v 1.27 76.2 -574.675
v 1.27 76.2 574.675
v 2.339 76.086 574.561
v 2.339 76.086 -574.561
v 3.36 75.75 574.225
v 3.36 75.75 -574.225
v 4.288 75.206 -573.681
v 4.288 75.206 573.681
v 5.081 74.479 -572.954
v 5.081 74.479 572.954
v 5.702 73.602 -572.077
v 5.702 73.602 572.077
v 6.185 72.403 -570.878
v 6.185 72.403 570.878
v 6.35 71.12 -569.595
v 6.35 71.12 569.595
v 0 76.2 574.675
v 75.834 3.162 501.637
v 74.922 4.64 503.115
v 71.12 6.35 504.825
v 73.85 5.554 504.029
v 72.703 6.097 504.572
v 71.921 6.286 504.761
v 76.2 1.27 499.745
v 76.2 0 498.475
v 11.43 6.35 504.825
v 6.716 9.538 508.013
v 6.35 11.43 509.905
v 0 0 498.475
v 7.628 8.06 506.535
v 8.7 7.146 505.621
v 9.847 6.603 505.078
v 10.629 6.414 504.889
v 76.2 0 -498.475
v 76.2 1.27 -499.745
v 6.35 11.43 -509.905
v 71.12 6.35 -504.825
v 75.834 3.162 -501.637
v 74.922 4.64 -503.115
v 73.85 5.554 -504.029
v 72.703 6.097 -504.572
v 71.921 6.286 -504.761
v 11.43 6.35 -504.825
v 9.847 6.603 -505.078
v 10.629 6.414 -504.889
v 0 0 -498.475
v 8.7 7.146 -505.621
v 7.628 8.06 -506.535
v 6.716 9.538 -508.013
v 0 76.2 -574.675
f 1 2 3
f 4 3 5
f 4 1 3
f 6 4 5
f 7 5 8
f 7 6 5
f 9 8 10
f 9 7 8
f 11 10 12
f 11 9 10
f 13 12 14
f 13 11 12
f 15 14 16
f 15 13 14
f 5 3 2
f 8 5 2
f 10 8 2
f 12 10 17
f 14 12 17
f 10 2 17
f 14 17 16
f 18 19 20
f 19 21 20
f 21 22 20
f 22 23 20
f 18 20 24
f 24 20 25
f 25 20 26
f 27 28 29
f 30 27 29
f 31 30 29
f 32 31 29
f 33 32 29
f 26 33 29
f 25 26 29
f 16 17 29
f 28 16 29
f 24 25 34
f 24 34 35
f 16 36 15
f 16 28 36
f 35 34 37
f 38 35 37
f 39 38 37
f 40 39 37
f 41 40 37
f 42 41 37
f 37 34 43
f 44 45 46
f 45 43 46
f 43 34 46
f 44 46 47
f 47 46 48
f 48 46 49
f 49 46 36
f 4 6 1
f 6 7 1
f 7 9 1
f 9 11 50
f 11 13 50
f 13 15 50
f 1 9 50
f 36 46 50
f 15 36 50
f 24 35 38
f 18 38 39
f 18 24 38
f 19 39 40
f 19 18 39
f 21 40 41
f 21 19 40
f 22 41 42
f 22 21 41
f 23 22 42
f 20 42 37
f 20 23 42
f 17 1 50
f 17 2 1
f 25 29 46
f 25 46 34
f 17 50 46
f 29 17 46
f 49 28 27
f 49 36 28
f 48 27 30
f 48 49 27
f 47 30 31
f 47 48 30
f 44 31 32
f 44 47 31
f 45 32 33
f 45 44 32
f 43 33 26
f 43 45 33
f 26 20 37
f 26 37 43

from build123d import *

# Parameters (mm, degrees)
F1_DEPTH = 574.675
F3_DEPTH = 76.2
F4_R     = 5.08


with BuildPart() as f1:
    # F0 (on Top) → F1 (new body, symmetric)
    with BuildSketch(Plane.XY):
        Polygon((0, 76.2), (0, 0), (76.2, 0), (76.2, 6.35), (6.35, 6.35), (6.35, 76.2), align=None)
    extrude(amount=F1_DEPTH, both=True)

    # F2 (on face) → F3 (cut)
    with BuildSketch(Plane(origin=(0, 0, 0), x_dir=(0, -1, 0), z_dir=(-1, 0, 0))):
        Polygon((-76.2, -574.675), (0, -574.675), (0, -498.475), align=None)
        Polygon((0, 574.675), (-76.2, 574.675), (0, 498.475), align=None)
    extrude(amount=-F3_DEPTH, mode=Mode.SUBTRACT)

    # F4
    f4_edges = [f1.edges().sort_by_distance(p)[0] for p in [
        (6.35, 76.2, 0),
        (6.35, 6.35, 0),
        (76.2, 6.35, 0),
    ]]
    fillet(f4_edges, radius=F4_R)


solid = f1.part
